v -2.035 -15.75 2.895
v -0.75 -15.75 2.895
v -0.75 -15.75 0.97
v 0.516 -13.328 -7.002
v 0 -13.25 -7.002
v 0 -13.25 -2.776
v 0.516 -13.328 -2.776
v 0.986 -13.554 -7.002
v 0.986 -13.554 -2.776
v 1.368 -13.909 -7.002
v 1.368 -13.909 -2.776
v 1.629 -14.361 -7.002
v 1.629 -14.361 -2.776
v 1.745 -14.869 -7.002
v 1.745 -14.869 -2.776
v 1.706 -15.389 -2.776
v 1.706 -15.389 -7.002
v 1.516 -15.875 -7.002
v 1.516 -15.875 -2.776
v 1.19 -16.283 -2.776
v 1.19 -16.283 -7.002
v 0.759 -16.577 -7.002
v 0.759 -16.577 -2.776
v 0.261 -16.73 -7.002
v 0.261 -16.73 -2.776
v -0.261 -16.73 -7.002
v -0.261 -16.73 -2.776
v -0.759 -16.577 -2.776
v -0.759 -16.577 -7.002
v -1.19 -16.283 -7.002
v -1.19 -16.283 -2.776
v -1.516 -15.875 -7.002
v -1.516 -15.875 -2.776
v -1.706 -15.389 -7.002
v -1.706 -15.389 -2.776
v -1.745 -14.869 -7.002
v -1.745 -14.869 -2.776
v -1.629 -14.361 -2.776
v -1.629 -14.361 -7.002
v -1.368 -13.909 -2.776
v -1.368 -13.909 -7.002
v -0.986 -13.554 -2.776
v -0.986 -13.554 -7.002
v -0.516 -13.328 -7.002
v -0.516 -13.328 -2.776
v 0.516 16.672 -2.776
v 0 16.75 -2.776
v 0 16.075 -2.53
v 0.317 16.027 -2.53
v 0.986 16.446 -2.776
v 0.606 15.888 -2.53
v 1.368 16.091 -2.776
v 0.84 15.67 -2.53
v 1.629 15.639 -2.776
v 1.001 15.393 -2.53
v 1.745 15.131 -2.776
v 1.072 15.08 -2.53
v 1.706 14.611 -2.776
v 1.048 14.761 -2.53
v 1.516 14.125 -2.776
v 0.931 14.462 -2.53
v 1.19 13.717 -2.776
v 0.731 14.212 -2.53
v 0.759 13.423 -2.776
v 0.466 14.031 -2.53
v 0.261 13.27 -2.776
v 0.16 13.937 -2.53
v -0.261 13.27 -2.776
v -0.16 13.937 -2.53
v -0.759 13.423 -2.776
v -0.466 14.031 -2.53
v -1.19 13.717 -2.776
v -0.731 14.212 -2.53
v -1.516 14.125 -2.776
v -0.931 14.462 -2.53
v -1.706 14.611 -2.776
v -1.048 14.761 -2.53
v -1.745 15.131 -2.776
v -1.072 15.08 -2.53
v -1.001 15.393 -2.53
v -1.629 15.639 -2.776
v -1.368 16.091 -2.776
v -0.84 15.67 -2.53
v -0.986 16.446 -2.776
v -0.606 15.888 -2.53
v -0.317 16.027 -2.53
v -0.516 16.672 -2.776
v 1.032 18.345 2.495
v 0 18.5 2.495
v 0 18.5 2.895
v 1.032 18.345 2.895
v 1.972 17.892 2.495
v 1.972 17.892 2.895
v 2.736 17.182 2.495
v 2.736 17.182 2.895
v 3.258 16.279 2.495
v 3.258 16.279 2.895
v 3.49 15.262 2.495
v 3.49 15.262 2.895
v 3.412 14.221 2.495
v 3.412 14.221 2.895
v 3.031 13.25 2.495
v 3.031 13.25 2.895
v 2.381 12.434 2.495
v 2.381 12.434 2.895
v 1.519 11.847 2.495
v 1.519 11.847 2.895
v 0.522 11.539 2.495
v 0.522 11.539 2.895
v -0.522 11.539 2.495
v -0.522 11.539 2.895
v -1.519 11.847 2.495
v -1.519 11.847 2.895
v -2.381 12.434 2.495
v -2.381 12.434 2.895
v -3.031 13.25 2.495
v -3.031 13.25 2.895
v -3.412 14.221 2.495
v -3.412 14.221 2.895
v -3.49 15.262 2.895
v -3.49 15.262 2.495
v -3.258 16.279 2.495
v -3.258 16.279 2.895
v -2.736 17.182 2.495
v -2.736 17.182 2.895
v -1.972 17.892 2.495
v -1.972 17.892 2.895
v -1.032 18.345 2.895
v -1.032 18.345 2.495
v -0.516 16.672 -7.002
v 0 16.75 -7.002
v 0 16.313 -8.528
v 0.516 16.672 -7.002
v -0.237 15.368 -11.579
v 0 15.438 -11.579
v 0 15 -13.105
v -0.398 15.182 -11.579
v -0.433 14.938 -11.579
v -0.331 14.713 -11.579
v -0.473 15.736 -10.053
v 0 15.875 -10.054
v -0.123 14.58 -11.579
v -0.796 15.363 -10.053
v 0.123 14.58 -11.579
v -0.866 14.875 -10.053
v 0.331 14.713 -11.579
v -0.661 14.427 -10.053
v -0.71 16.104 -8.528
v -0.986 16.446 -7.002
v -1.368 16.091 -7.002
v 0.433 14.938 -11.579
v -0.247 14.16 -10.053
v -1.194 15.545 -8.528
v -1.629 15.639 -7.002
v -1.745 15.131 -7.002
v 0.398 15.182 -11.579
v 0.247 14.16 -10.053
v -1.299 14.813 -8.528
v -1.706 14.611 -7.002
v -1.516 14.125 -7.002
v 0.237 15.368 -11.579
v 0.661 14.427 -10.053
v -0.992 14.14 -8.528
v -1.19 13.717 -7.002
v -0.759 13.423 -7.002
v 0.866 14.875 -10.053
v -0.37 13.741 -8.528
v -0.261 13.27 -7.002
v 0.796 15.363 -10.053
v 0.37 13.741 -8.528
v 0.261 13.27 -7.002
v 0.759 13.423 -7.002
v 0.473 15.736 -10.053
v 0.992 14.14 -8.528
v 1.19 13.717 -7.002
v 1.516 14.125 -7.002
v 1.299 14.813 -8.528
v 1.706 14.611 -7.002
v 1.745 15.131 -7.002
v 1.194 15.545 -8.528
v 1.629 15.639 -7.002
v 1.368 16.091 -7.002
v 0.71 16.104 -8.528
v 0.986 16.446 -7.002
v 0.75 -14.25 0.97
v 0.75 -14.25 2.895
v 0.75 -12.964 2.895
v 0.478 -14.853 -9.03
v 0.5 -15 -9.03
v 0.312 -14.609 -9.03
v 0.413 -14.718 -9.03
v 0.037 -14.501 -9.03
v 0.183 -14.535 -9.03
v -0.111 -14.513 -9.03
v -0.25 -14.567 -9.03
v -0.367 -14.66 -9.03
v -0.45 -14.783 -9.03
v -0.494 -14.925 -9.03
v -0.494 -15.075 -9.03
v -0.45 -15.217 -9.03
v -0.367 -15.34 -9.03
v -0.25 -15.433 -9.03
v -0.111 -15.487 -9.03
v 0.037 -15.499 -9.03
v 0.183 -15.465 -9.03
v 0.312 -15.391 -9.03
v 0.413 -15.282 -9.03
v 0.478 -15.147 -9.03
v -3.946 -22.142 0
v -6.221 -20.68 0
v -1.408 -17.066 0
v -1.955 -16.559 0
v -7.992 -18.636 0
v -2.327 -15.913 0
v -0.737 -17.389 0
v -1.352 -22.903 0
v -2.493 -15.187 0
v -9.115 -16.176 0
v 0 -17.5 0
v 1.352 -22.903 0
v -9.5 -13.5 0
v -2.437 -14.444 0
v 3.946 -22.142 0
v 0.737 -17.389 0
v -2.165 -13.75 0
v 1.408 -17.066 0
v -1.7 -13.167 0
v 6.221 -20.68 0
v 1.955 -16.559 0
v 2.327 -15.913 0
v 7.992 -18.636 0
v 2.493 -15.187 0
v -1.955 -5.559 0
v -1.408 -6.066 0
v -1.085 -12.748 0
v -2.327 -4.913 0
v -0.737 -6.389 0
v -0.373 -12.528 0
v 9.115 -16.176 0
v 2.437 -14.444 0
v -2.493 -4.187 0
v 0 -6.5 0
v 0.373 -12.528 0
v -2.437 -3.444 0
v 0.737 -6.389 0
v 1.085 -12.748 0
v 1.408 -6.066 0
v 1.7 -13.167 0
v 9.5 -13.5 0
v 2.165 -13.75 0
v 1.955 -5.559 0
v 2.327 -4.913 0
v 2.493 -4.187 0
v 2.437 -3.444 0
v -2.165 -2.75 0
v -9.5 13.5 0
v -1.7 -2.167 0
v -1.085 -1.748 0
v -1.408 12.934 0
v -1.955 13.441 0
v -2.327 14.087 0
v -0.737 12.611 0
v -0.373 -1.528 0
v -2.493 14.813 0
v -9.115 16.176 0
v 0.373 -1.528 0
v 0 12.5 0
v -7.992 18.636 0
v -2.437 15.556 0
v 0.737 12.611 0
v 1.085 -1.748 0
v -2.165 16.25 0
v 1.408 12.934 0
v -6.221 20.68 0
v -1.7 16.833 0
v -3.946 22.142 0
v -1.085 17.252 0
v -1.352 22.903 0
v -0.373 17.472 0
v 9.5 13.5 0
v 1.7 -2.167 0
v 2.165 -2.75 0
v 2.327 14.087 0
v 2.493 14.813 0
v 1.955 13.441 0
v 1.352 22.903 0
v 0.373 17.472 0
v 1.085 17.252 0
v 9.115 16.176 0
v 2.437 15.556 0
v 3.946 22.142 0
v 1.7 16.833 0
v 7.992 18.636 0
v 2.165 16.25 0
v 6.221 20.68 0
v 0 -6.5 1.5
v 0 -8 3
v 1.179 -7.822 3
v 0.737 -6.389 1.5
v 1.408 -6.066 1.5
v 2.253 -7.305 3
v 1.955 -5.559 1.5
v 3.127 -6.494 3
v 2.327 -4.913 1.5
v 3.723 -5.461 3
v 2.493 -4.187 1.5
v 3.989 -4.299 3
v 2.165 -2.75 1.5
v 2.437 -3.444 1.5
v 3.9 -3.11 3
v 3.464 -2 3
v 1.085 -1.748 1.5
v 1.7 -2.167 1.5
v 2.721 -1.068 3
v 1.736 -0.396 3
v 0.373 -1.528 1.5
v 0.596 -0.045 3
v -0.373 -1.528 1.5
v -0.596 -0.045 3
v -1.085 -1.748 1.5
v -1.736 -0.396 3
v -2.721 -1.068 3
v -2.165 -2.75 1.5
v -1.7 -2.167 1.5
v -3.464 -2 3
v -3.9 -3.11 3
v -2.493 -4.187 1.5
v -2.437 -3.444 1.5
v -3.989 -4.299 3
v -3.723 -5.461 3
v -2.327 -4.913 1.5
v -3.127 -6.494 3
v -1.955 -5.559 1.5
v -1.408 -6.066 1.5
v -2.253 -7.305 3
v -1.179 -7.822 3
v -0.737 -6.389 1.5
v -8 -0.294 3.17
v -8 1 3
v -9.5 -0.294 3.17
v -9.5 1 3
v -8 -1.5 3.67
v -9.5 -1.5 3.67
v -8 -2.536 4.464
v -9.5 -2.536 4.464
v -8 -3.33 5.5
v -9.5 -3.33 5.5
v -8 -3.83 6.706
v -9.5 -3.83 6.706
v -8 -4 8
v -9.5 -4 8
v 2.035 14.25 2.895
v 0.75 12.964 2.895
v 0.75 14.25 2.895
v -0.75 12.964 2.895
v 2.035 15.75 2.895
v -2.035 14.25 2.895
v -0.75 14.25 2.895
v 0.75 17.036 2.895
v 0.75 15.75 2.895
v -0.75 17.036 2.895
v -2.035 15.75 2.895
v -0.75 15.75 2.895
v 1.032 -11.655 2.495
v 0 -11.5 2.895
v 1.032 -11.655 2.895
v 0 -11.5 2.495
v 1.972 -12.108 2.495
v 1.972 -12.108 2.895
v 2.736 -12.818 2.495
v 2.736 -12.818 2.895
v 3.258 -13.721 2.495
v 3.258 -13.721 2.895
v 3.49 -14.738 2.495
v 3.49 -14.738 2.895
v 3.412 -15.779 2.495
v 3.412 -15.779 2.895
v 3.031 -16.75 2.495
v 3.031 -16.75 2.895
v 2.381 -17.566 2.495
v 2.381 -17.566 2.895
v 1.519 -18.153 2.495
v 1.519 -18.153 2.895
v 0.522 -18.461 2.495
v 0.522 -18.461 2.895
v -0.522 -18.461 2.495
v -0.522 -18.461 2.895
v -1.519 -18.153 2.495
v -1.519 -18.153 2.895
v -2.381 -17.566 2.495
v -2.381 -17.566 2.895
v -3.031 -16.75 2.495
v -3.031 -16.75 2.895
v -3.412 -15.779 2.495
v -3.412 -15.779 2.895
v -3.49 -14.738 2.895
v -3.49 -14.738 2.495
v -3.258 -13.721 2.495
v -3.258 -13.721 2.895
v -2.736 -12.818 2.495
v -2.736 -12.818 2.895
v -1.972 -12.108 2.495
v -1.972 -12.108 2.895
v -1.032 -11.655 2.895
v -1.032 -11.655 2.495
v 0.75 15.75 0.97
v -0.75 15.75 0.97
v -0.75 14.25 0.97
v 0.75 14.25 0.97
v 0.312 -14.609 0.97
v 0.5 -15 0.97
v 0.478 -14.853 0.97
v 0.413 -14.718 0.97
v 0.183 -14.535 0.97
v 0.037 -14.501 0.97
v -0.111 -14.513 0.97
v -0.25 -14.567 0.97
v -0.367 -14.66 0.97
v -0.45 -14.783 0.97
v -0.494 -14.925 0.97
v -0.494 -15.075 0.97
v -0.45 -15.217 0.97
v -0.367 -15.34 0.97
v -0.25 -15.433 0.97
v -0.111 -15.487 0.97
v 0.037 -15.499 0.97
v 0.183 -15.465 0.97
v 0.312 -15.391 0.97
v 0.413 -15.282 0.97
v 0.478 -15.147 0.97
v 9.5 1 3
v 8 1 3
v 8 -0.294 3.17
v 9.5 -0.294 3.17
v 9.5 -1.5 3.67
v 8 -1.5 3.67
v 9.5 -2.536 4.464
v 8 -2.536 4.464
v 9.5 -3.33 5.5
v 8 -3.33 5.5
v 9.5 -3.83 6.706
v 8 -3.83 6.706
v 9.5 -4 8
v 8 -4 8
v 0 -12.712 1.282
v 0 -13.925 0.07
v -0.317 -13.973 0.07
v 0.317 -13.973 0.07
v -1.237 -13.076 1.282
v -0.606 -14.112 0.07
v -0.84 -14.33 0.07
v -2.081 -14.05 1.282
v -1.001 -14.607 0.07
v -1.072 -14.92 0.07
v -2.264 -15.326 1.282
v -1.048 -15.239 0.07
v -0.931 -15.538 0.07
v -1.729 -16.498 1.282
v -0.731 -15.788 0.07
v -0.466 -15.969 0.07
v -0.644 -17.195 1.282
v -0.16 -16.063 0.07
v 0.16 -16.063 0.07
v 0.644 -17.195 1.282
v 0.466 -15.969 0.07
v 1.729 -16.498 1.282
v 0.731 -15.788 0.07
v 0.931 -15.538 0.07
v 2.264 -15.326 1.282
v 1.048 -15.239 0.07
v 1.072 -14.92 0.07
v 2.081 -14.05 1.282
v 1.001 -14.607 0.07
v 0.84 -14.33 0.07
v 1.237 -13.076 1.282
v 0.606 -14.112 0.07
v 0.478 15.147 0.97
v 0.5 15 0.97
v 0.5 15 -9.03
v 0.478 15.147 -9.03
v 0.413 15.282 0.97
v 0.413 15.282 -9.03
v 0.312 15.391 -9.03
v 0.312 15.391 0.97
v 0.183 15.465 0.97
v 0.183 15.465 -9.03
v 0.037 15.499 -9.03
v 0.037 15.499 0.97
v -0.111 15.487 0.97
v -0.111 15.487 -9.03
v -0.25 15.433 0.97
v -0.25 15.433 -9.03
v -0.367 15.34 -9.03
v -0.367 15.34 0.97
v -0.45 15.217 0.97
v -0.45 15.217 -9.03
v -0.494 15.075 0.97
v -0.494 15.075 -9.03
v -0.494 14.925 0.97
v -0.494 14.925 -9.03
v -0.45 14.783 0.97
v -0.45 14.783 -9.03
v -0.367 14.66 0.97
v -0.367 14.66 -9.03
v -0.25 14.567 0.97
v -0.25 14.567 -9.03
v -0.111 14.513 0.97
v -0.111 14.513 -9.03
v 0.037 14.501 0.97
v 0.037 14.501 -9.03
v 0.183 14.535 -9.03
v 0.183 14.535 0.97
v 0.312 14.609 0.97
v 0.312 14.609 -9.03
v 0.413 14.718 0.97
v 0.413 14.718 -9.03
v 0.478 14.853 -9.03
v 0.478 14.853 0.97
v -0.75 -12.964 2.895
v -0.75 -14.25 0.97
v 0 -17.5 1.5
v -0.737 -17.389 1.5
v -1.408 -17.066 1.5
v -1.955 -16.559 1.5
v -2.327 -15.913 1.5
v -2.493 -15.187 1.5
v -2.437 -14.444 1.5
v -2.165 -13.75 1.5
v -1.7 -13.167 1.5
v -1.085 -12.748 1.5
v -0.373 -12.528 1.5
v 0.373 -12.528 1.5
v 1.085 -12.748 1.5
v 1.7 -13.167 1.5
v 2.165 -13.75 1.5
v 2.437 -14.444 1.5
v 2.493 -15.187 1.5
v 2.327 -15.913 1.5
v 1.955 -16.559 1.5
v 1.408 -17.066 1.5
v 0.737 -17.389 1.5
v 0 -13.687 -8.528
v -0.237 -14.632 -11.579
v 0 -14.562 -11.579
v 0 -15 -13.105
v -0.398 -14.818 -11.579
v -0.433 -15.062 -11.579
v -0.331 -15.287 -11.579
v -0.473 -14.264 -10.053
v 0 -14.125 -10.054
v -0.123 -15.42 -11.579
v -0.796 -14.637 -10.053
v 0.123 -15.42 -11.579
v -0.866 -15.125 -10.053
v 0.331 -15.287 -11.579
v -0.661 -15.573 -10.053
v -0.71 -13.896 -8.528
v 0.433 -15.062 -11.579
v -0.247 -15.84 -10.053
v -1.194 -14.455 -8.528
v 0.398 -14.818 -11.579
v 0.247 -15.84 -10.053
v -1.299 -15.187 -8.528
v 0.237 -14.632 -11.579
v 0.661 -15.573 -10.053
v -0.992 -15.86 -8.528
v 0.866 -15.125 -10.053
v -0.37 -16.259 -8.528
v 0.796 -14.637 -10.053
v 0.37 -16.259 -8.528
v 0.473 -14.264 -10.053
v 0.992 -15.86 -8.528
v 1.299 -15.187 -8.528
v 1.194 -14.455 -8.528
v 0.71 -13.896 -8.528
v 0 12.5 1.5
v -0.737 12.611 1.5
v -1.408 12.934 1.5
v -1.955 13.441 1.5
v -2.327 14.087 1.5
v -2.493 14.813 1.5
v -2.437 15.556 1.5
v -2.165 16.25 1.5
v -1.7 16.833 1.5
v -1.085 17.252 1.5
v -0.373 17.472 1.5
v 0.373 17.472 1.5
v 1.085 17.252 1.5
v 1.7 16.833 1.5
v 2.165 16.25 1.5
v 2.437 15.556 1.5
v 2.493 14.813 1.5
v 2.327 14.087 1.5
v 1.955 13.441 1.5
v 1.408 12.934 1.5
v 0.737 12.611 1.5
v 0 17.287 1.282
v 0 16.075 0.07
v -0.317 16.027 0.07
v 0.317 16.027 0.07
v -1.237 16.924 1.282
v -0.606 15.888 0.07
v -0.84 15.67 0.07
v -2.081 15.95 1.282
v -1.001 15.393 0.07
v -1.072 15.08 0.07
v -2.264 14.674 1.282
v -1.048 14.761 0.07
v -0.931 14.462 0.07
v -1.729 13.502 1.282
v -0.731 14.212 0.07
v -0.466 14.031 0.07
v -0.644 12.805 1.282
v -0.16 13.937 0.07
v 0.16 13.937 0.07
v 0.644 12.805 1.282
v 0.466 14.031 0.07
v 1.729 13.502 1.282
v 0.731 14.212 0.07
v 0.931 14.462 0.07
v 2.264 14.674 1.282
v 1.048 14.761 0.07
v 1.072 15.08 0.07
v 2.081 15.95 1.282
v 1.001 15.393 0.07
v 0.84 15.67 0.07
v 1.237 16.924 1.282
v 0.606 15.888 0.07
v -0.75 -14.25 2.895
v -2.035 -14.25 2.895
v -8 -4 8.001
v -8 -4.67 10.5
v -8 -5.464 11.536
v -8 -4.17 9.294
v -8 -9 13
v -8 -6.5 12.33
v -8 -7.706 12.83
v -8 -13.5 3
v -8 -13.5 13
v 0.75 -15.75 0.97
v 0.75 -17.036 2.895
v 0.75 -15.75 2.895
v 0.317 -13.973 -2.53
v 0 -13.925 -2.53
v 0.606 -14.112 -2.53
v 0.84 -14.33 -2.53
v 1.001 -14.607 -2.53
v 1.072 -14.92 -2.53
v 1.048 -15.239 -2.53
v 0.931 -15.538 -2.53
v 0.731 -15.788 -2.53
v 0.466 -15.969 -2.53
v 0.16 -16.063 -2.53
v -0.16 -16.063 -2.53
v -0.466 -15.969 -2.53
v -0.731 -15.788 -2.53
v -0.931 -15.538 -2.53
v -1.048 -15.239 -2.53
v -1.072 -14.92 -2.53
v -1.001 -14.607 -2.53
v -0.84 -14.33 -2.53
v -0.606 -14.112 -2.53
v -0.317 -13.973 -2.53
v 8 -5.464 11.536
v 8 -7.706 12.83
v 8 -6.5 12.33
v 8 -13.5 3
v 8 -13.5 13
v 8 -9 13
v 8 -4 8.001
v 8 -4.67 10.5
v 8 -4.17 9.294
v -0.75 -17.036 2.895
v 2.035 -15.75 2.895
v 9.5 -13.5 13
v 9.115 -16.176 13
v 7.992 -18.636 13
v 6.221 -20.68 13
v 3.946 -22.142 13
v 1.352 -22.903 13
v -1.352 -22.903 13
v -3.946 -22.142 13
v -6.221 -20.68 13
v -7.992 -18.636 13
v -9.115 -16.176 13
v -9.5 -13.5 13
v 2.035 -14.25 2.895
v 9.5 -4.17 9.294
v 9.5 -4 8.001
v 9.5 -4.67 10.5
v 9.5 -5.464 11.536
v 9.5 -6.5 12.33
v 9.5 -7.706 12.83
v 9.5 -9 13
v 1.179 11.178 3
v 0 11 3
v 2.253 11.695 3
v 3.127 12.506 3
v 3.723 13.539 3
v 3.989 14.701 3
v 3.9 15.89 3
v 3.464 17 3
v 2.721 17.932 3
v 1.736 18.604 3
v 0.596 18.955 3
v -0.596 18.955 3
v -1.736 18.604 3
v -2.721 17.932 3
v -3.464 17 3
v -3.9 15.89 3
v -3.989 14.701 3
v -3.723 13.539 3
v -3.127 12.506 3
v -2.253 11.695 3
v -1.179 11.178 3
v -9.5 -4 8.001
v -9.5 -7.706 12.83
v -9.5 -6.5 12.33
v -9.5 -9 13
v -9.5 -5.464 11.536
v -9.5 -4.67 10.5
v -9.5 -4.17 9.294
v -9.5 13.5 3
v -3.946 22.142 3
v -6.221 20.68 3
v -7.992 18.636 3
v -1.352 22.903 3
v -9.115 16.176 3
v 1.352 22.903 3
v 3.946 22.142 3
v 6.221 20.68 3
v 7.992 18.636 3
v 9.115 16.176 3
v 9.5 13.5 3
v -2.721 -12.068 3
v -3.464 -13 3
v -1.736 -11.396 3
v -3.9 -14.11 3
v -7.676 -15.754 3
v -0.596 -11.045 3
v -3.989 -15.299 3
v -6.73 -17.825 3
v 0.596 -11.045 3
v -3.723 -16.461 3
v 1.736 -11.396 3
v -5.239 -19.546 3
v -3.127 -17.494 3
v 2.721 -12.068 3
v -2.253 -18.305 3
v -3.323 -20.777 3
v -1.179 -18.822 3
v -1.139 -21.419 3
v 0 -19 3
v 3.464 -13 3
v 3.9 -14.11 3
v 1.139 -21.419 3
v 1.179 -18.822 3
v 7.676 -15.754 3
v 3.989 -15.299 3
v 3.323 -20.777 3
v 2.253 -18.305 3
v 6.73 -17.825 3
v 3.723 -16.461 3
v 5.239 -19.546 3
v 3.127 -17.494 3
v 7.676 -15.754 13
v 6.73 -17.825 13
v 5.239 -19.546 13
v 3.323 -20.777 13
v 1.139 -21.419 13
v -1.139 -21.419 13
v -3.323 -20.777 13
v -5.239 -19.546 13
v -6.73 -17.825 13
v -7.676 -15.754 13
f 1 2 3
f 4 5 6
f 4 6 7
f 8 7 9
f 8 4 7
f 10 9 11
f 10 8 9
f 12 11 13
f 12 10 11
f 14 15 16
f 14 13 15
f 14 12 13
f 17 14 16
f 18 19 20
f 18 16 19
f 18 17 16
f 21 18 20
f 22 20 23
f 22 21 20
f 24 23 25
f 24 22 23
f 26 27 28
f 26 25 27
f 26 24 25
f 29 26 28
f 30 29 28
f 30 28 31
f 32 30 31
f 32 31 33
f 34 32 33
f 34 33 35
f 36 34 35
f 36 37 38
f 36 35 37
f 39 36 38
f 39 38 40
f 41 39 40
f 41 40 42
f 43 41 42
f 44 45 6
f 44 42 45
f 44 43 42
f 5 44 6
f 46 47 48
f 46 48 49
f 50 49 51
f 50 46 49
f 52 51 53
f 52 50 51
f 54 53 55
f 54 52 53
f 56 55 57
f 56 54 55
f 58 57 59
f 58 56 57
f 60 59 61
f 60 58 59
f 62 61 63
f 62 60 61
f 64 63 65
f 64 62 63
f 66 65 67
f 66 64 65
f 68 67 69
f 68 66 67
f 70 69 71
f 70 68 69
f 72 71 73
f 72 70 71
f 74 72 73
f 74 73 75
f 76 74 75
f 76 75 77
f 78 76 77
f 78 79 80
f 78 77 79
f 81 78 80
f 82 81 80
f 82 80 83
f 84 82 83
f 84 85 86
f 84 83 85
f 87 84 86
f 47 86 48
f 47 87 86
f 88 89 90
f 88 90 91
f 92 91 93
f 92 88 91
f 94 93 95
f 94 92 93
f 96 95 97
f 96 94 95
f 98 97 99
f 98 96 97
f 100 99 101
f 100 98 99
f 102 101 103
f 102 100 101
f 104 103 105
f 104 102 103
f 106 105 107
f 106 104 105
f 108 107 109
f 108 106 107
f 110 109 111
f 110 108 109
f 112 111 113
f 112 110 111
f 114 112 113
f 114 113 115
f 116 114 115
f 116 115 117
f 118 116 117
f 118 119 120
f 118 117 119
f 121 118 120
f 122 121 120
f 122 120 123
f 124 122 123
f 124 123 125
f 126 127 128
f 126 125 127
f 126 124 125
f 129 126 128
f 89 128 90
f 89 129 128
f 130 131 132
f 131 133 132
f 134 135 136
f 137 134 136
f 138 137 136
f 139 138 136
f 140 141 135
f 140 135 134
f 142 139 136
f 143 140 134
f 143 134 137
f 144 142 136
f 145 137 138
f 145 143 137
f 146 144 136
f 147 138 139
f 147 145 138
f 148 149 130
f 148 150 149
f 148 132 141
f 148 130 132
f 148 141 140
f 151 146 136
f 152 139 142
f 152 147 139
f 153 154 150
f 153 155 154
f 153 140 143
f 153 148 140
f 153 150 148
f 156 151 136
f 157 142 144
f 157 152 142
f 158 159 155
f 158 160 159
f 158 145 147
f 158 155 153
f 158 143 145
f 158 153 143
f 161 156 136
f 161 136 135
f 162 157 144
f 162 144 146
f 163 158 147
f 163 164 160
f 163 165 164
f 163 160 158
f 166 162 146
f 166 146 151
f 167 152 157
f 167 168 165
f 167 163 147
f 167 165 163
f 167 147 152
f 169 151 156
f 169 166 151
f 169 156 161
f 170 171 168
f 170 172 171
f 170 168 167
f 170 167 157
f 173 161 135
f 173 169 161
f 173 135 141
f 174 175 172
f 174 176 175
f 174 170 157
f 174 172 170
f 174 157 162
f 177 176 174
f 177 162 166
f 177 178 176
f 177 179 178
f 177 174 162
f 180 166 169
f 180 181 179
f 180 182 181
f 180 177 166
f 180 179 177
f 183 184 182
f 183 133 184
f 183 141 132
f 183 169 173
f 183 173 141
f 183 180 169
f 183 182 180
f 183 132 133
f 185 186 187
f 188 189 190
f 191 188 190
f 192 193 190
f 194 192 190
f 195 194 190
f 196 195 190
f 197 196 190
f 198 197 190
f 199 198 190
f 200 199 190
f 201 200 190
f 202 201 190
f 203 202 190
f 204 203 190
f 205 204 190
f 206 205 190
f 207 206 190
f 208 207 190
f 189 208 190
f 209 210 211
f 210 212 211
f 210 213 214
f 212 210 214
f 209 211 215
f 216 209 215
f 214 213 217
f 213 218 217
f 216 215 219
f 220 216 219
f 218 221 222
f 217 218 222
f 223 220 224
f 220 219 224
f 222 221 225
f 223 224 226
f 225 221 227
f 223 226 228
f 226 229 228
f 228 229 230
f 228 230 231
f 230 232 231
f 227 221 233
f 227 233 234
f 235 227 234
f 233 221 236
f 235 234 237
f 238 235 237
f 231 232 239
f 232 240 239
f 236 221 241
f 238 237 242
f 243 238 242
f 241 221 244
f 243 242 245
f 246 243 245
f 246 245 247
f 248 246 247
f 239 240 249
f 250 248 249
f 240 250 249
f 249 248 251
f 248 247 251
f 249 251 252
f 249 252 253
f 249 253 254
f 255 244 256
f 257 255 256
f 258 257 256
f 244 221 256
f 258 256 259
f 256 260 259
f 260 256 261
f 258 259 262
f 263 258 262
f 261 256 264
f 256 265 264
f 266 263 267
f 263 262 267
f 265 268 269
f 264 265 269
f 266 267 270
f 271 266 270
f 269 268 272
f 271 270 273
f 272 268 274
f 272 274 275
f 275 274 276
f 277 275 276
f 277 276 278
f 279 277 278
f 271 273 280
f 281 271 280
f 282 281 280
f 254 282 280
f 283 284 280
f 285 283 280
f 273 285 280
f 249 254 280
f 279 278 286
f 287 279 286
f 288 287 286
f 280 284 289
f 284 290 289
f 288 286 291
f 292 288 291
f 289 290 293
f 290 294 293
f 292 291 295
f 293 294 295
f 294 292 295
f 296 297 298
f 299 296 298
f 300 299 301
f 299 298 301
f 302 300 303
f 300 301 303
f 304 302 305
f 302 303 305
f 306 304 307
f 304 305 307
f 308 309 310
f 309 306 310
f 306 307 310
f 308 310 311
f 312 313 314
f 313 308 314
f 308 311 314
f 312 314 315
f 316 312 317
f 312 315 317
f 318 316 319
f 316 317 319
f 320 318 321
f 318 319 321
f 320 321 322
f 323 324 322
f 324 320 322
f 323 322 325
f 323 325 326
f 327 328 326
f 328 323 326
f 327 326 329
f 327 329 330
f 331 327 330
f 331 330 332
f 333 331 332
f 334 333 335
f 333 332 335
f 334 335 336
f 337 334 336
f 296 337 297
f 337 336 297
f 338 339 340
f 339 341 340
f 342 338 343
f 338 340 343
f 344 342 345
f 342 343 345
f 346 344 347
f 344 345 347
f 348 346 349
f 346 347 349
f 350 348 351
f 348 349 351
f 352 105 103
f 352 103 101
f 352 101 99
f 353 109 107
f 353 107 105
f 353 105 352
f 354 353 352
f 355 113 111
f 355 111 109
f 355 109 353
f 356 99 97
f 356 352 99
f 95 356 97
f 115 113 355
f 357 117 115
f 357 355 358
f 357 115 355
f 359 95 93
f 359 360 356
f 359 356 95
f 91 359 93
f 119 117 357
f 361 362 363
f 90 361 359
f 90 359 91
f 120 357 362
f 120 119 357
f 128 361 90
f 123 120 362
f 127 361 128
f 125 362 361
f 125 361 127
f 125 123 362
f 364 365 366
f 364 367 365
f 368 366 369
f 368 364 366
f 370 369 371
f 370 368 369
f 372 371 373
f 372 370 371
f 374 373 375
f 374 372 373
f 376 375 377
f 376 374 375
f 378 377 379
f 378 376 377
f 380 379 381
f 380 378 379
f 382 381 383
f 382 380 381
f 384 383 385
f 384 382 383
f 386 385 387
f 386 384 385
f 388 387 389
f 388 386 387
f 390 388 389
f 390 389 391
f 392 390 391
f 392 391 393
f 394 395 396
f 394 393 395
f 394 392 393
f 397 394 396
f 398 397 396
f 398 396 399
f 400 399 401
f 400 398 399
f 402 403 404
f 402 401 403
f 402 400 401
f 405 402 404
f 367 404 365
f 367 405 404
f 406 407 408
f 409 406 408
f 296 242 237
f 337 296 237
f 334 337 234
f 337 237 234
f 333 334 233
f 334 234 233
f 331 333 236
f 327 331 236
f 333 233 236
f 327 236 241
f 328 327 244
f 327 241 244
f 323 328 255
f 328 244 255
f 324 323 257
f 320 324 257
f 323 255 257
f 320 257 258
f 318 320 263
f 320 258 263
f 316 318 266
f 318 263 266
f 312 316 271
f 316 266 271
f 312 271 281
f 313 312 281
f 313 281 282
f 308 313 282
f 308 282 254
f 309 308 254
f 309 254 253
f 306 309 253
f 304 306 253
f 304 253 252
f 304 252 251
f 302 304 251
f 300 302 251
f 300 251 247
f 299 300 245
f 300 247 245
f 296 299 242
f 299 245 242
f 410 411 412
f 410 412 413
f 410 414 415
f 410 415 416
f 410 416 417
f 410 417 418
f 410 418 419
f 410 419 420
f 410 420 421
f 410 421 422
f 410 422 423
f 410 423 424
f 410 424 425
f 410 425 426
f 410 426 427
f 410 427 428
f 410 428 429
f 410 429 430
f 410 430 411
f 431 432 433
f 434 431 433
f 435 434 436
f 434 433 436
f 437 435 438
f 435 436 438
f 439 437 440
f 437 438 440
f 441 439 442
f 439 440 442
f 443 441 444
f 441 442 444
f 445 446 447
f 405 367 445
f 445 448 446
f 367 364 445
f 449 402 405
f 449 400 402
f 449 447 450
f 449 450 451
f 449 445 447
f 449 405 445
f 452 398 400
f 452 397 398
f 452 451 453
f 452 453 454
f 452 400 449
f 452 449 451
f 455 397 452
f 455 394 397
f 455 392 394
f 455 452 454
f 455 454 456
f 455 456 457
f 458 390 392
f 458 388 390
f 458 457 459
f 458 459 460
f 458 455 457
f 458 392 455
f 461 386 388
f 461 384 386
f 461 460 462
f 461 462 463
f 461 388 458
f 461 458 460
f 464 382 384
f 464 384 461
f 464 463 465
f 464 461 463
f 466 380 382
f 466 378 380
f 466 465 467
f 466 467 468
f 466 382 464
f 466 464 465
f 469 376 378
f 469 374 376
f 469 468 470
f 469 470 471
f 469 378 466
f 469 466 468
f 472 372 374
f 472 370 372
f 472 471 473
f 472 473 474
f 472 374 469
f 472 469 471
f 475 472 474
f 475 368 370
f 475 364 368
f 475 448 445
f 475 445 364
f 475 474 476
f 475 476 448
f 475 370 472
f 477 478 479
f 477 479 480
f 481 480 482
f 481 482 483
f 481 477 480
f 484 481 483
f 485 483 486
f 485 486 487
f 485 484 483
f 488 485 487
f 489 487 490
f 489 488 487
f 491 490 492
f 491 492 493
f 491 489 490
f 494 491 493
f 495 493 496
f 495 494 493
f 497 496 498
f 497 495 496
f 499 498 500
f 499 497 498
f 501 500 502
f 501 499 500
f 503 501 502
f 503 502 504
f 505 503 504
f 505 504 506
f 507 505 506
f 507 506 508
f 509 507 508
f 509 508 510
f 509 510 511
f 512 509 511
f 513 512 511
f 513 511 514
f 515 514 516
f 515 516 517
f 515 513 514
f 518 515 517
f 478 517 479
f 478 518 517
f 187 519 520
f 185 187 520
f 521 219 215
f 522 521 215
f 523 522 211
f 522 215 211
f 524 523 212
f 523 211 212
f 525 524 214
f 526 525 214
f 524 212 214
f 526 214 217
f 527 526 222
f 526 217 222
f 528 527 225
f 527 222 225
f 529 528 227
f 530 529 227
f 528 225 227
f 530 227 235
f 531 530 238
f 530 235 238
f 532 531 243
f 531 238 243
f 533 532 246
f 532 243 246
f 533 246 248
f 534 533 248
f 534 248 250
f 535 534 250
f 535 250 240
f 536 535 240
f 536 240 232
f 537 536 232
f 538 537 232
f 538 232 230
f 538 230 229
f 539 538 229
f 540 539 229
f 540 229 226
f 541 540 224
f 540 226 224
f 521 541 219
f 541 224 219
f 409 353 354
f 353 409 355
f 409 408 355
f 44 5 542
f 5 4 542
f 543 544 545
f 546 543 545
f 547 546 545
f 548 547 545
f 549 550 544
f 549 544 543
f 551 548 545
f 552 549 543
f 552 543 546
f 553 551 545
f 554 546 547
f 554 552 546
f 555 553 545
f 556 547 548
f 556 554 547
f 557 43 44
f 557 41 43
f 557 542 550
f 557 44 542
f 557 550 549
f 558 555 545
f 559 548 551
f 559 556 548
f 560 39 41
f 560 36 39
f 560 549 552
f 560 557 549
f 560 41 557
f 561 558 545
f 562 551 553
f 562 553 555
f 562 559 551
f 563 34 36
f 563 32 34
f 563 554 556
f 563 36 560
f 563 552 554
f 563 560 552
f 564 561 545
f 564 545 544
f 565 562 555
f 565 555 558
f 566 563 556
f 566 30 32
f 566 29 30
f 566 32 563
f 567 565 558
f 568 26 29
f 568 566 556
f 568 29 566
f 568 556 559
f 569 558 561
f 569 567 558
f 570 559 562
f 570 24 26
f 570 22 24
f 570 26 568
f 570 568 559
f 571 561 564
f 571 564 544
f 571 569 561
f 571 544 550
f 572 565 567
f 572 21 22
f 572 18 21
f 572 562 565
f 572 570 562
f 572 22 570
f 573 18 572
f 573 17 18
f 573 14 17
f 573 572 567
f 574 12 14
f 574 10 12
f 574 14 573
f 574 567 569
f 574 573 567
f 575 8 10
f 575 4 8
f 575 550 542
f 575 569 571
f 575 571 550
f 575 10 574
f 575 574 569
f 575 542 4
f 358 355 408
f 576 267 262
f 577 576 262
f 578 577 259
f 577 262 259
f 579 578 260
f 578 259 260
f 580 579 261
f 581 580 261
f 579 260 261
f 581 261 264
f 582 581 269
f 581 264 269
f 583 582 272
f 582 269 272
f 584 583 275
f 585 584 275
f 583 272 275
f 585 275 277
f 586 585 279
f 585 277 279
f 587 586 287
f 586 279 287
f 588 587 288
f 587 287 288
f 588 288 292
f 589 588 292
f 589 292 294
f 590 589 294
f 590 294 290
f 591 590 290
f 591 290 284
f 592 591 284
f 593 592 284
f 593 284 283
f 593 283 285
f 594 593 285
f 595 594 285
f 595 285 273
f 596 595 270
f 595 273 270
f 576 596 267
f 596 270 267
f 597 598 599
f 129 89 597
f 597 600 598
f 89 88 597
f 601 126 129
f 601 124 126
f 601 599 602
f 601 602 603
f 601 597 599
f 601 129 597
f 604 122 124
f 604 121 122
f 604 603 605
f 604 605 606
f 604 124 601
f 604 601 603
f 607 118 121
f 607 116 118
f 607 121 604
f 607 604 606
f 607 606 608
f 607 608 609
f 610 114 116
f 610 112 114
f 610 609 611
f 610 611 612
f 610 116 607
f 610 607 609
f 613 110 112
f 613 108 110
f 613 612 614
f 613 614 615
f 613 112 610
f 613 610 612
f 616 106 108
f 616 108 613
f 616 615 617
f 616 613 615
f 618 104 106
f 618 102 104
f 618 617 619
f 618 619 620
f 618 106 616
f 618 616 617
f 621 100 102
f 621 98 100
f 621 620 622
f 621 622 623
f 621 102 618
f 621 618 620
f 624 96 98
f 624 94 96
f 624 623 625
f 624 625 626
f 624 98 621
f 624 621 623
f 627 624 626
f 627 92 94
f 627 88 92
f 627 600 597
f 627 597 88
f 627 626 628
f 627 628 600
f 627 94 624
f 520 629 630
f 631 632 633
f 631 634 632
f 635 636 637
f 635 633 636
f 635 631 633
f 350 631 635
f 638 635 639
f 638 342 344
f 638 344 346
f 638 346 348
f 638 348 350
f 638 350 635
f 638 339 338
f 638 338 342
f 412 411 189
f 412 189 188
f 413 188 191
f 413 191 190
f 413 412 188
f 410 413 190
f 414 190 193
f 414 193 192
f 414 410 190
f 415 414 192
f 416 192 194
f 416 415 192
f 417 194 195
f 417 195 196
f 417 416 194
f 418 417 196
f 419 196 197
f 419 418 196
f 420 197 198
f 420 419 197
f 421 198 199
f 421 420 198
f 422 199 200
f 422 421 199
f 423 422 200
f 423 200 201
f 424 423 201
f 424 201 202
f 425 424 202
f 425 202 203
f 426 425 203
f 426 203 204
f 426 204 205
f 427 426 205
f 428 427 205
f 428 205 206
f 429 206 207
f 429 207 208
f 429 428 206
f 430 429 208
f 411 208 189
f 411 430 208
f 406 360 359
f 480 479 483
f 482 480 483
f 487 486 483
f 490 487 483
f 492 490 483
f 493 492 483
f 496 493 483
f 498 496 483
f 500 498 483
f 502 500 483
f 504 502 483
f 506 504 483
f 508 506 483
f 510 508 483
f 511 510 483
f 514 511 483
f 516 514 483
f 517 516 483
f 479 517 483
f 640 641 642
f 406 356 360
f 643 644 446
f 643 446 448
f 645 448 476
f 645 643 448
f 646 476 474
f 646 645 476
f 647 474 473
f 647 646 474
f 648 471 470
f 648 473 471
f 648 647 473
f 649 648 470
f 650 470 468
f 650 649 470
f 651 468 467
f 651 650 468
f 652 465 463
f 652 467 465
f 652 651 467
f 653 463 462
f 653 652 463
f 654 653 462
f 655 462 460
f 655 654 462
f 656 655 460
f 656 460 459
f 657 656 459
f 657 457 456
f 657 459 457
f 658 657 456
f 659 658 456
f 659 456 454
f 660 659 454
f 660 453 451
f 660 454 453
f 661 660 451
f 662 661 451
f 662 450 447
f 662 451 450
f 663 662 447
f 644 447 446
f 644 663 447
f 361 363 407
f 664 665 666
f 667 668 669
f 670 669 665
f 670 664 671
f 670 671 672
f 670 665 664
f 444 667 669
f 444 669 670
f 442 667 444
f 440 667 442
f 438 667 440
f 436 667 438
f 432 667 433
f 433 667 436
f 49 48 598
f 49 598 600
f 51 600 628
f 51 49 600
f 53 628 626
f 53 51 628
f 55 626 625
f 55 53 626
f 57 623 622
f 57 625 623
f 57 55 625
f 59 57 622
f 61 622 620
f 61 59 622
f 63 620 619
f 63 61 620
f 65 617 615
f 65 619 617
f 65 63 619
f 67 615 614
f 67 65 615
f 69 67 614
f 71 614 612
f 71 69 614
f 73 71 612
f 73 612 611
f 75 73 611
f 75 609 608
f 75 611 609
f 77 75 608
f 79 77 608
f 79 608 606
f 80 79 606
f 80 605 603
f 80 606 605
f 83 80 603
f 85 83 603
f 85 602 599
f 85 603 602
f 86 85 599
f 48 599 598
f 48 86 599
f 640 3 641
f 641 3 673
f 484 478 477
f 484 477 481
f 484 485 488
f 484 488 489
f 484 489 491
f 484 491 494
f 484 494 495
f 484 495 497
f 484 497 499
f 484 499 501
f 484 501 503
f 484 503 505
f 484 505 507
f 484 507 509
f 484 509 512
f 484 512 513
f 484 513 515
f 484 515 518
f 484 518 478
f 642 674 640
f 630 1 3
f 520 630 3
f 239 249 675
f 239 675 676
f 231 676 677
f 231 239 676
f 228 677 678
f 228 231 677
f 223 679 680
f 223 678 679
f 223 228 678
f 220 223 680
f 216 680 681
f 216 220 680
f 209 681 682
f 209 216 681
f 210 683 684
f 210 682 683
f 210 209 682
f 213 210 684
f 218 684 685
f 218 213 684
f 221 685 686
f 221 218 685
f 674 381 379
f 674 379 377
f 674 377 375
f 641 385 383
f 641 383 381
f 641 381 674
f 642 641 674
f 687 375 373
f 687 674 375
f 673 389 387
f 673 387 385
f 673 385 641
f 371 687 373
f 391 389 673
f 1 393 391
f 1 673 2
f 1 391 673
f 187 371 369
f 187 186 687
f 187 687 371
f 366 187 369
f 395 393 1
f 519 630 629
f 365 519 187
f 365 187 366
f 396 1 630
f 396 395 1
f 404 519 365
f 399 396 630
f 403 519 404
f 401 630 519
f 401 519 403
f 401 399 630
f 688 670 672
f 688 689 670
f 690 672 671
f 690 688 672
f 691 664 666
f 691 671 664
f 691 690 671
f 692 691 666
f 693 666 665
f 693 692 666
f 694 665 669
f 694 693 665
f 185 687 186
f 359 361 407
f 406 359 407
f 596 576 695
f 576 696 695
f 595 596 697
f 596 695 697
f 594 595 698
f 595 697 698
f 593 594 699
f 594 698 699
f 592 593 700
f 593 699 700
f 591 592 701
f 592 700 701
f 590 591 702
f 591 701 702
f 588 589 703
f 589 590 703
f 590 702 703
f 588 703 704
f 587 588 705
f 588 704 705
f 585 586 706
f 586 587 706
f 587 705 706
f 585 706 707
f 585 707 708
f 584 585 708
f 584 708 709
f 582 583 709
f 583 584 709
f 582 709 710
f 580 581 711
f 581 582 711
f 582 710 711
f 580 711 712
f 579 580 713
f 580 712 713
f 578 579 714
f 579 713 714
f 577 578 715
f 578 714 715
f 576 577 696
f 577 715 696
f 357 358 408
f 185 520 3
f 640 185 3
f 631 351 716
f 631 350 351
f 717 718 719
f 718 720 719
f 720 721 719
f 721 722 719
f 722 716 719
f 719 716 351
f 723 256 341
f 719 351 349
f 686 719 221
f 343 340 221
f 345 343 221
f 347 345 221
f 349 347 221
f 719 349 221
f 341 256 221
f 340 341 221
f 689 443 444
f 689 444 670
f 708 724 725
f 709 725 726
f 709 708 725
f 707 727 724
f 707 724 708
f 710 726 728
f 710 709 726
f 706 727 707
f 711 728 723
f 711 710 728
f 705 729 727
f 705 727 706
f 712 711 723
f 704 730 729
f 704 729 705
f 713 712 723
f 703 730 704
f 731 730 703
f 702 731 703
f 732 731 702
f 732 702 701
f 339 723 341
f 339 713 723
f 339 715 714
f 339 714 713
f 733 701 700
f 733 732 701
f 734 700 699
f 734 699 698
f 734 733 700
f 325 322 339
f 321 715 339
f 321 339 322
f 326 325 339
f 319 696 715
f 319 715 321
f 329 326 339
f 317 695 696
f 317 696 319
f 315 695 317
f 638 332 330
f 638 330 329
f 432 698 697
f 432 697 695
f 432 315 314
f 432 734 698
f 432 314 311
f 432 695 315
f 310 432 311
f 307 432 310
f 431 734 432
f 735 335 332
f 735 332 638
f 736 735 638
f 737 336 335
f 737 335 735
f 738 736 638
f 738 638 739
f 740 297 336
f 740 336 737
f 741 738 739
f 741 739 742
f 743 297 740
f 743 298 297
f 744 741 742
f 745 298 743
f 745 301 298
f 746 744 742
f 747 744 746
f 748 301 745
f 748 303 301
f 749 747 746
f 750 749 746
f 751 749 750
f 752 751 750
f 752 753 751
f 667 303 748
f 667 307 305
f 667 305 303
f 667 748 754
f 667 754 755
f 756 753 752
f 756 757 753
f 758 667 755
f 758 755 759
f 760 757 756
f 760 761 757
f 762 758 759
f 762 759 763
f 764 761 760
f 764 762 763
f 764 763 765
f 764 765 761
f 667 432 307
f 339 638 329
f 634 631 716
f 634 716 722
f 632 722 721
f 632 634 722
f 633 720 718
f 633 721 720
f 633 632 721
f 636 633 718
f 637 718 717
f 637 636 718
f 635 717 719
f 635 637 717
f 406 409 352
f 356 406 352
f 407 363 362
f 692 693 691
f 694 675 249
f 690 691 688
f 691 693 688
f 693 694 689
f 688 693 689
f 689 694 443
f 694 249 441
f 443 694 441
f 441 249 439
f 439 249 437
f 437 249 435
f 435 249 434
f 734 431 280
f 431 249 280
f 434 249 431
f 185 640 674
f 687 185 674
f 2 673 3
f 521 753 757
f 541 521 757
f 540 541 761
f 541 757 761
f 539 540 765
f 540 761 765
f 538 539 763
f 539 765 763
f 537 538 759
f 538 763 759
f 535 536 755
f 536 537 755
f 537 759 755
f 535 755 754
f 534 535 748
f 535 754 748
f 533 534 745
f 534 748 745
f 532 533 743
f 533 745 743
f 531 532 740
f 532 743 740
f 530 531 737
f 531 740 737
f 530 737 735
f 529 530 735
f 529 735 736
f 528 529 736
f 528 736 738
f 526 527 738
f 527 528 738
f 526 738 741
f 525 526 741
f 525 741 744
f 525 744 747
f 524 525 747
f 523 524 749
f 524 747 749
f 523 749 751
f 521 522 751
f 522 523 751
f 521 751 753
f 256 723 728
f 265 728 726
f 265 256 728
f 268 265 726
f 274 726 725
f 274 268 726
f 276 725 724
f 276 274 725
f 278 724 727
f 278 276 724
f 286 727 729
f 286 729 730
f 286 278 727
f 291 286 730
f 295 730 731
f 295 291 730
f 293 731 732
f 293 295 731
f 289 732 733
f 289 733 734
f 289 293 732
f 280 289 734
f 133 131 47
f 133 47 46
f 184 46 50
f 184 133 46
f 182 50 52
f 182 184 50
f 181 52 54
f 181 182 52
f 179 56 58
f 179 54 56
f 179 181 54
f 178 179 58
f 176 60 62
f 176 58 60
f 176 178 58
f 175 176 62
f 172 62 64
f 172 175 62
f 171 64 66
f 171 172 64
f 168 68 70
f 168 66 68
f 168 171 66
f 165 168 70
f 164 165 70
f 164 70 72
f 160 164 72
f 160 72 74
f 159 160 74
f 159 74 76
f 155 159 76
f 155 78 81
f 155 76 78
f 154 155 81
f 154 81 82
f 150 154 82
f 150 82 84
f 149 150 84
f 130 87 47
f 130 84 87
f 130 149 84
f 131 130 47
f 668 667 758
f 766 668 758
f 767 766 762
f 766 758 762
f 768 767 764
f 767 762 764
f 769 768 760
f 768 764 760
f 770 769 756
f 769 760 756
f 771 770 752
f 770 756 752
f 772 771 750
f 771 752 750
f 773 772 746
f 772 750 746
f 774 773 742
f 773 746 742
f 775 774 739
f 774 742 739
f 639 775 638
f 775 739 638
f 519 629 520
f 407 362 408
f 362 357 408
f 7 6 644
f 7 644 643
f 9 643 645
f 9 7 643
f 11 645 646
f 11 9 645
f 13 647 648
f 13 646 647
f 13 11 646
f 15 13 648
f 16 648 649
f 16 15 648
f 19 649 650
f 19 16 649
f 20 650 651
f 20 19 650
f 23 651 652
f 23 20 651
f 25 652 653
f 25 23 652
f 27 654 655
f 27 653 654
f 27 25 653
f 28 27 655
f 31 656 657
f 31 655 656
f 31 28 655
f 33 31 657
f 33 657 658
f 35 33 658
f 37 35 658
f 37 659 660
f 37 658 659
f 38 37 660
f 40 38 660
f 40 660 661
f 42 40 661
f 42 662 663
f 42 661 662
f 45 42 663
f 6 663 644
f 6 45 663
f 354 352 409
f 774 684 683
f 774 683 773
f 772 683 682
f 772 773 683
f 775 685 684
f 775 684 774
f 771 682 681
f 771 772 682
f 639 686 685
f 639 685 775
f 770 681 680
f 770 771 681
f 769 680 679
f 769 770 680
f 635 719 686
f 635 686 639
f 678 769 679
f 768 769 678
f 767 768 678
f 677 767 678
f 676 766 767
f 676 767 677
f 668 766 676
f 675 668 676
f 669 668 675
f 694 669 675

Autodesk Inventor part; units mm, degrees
ref_plane "YZ Plane" through (0, 0, 0) normal (1, 0, 0) x (0, 1, 0)
ref_plane "XZ Plane" through (0, 0, 0) normal (0, 1, 0) x (-1, 0, 0)
ref_plane "XY Plane" through (0, 0, 0) normal (0, 0, 1) x (1, 0, 0)
sketch "Sketch1" plane through (0, 0, 0) normal (0, 0, 1) x (1, 0, 0)
  line L0 (0, -13.5) -> (0, 13.5) construction
  line L1 (8, -13.5) -> (8, 13.5)
  line L2 (-8, 13.5) -> (-8, -13.5)
  arc A0 (-8, -13.5) -> (8, -13.5) centre (0, -13.5) ccw
  arc A1 (8, 13.5) -> (-8, 13.5) centre (0, 13.5) ccw
  line L3 (-9.5, 13.5) -> (-9.5, -13.5)
  arc A2 (-9.5, -13.5) -> (9.5, -13.5) centre (0, -13.5) ccw
  line L4 (9.5, -13.5) -> (9.5, 13.5)
  arc A3 (9.5, 13.5) -> (-9.5, 13.5) centre (0, 13.5) ccw
  line L5 (0, 23) -> (-20.3144, 23) construction
  line L6 (0, -23) -> (-17.7567, -23) construction
  point P0 (0, 0)
  point P1 (0, 15)
  point P2 (0, -4)
  point P3 (0, -15)
  dimension "d2" = 1.5
  dimension "d3" = 19
  dimension "d6" = 46
  dimension "d7" = 8
  dimension "d8" = 8
  dimension "d13" = 11
extrude "Extrusion1" add sketch "Sketch1" along normal blind 3 contours A0 L2 A1 L1 | A3 L4 A2 L3
extrude "Extrusion2" add sketch "Sketch1" along normal blind 13
sketch "Sketch2" plane through (8, -13.5, 3) normal (-1, 0, 0) x (0, 0, 1)
  line L0 (-3, 36.5) -> (10, 36.5) projected
  line L1 (10, 0) -> (10, 0) projected
  line L2 (10, 0) -> (10, 27) projected
  line L3 (10, 27) -> (10, 27) projected
  line L4 (10, 27) -> (10, 0) projected
  line L5 (10, 27) -> (10, 0) projected
  line L6 (10, 0) -> (10, 0) projected
  line L7 (10, 0) -> (10, 27) projected
  line L8 (10, 27) -> (10, 27) projected
  line L9 (0, 0) -> (0, 0) projected
  line L10 (0, 0) -> (0, 27) projected
  line L11 (0, 27) -> (0, 27) projected
  line L12 (0, 27) -> (0, 0) projected
  line L13 (0, 9.5) -> (10, 9.5)
  line L14 (10, 9.5) -> (10, 36.5)
  line L15 (10, 36.5) -> (0, 36.5)
  line L16 (0, 36.5) -> (0, 9.5)
  point P0 (-3, 13.5)
  point P1 (-3, 9.5)
extrude "Extrusion3" cut sketch "Sketch2" along normal through all both and the other way through all
fillet "Fillet1" radius 5 4 edges at (8.75, -4, 13) (8.75, -4, 3) (-8.75, -4, 13) (-8.75, -4, 3)
sketch "Sketch3" plane through (0, 0, 3) normal (0, 0, 1) x (1, 0, 0)
  point P0 (0, 0)
  point P1 (0, 15)
  point P2 (0, -4)
  point P3 (0, -15)
hole "Hole1" at (0, 15, 3) at (0, -4, 3) at (0, -15, 3) direction (0, 0, -1) diameter 5 depth 8 tip angle 118 countersink diameter 8 countersink angle 90
sketch "Sketch4" plane through (0, 0, 0) normal (1, 0, 0) x (0, 1, 0)
  line L0 (15, 2.895) -> (18.5, 2.895)
  line L1 (18.5, 2.895) -> (18.5, 2.495)
  line L2 (18.5, 2.495) -> (16.075, 0.07)
  line L3 (16.075, 0.07) -> (16.075, -2.53)
  line L4 (16.075, -2.53) -> (16.75, -2.7757)
  line L5 (16.75, -2.7757) -> (16.75, -7.002)
  line L6 (16.75, -7.002) -> (15, -13.105)
  line L7 (15, -13.105) -> (15, 2.895)
  line L8 (15, -18.326) -> (15, 18.221) projected
  line L9 (17.5, 1.5) -> (19, 3) projected
  point P0 (0, 0)
  dimension "d24" = 7
  dimension "d25" = 45
  dimension "d26" = 16
  dimension "d27" = 2.6
  dimension "d28" = 110
  dimension "d29" = 2.15
  dimension "d30" = 3.5
  dimension "d31" = 0.4
  dimension "d32" = 16
revolve "Revolution1" add sketch "Sketch4" angle 360 about axis through (0, 15, -13.105) along (0, 0, 1) separate body
thread "Thread1" size "M3.5x0.6" class "6g" standard "ANSI Metric M Profile" full length
thread "Thread2" size "R 4" standard "ISO Taper" full length
sketch "Sketch6" plane through (0, 0, 0) normal (1, 0, 0) x (0, 1, 0)
  line L0 (11.5, 2.895) -> (18.5, 2.895) projected
  line L1 (17.0355, 2.895) -> (15.75, 0.9703)
  line L2 (15.75, 0.9703) -> (14.25, 0.9703)
  line L3 (14.25, 0.9703) -> (12.9645, 2.895)
  line L4 (17.0355, 2.895) -> (12.9645, 2.895)
  line L5 (15, -2.6) -> (15, 15.6) projected
  point P0 (0, 0)
  dimension "d48" = 1.5
extrude "Extrusion4" cut sketch "Sketch6" along normal mid plane 1.5 bodies 2
pattern_circular "Circular Pattern1" count 2 over 90 about axis through (0, 15, -1) along (0, 0, 1) of "Extrusion4" bodies 2
sketch "Sketch7" plane through (-0.75, 15.75, 0.9703) normal (0, 0, 1) x (1, 0, 0)
  circle A0 centre (0.75, -0.75) radius 1.075 projected
  circle A1 centre (0.75, -0.75) radius 0.5
  point P0 (0.75, -15.75)
  dimension "d52" = 1
extrude "Extrusion5" add sketch "Sketch7" against normal blind 10 separate body contours A1
pattern_linear "Rectangular Pattern1" count 2 spacing 30 along (0, -1, 0) bodies 2
pattern_linear "Rectangular Pattern2" count 2 spacing 30 along (0, -1, 0) bodies 3
equation "\"d16\" = -0.5 * d9 + 0.5 * d11"
equation "\"d24\" = d33"
equation "\"d27\" = d34"
equation "\"d29\" = d35"
equation "\"d30\" = d36"
equation "\"d32\" = d37"
equation "\"d33\" = 7"
equation "\"d34\" = 2.6"
equation "\"d35\" = 2.15"
equation "\"d36\" = 3.5"
equation "\"d37\" = 16"
equation "\"d9\" = 3"
equation "\"d11\" = 13"
properties part number "Fixture for the Oval Bar" material "Steel"
